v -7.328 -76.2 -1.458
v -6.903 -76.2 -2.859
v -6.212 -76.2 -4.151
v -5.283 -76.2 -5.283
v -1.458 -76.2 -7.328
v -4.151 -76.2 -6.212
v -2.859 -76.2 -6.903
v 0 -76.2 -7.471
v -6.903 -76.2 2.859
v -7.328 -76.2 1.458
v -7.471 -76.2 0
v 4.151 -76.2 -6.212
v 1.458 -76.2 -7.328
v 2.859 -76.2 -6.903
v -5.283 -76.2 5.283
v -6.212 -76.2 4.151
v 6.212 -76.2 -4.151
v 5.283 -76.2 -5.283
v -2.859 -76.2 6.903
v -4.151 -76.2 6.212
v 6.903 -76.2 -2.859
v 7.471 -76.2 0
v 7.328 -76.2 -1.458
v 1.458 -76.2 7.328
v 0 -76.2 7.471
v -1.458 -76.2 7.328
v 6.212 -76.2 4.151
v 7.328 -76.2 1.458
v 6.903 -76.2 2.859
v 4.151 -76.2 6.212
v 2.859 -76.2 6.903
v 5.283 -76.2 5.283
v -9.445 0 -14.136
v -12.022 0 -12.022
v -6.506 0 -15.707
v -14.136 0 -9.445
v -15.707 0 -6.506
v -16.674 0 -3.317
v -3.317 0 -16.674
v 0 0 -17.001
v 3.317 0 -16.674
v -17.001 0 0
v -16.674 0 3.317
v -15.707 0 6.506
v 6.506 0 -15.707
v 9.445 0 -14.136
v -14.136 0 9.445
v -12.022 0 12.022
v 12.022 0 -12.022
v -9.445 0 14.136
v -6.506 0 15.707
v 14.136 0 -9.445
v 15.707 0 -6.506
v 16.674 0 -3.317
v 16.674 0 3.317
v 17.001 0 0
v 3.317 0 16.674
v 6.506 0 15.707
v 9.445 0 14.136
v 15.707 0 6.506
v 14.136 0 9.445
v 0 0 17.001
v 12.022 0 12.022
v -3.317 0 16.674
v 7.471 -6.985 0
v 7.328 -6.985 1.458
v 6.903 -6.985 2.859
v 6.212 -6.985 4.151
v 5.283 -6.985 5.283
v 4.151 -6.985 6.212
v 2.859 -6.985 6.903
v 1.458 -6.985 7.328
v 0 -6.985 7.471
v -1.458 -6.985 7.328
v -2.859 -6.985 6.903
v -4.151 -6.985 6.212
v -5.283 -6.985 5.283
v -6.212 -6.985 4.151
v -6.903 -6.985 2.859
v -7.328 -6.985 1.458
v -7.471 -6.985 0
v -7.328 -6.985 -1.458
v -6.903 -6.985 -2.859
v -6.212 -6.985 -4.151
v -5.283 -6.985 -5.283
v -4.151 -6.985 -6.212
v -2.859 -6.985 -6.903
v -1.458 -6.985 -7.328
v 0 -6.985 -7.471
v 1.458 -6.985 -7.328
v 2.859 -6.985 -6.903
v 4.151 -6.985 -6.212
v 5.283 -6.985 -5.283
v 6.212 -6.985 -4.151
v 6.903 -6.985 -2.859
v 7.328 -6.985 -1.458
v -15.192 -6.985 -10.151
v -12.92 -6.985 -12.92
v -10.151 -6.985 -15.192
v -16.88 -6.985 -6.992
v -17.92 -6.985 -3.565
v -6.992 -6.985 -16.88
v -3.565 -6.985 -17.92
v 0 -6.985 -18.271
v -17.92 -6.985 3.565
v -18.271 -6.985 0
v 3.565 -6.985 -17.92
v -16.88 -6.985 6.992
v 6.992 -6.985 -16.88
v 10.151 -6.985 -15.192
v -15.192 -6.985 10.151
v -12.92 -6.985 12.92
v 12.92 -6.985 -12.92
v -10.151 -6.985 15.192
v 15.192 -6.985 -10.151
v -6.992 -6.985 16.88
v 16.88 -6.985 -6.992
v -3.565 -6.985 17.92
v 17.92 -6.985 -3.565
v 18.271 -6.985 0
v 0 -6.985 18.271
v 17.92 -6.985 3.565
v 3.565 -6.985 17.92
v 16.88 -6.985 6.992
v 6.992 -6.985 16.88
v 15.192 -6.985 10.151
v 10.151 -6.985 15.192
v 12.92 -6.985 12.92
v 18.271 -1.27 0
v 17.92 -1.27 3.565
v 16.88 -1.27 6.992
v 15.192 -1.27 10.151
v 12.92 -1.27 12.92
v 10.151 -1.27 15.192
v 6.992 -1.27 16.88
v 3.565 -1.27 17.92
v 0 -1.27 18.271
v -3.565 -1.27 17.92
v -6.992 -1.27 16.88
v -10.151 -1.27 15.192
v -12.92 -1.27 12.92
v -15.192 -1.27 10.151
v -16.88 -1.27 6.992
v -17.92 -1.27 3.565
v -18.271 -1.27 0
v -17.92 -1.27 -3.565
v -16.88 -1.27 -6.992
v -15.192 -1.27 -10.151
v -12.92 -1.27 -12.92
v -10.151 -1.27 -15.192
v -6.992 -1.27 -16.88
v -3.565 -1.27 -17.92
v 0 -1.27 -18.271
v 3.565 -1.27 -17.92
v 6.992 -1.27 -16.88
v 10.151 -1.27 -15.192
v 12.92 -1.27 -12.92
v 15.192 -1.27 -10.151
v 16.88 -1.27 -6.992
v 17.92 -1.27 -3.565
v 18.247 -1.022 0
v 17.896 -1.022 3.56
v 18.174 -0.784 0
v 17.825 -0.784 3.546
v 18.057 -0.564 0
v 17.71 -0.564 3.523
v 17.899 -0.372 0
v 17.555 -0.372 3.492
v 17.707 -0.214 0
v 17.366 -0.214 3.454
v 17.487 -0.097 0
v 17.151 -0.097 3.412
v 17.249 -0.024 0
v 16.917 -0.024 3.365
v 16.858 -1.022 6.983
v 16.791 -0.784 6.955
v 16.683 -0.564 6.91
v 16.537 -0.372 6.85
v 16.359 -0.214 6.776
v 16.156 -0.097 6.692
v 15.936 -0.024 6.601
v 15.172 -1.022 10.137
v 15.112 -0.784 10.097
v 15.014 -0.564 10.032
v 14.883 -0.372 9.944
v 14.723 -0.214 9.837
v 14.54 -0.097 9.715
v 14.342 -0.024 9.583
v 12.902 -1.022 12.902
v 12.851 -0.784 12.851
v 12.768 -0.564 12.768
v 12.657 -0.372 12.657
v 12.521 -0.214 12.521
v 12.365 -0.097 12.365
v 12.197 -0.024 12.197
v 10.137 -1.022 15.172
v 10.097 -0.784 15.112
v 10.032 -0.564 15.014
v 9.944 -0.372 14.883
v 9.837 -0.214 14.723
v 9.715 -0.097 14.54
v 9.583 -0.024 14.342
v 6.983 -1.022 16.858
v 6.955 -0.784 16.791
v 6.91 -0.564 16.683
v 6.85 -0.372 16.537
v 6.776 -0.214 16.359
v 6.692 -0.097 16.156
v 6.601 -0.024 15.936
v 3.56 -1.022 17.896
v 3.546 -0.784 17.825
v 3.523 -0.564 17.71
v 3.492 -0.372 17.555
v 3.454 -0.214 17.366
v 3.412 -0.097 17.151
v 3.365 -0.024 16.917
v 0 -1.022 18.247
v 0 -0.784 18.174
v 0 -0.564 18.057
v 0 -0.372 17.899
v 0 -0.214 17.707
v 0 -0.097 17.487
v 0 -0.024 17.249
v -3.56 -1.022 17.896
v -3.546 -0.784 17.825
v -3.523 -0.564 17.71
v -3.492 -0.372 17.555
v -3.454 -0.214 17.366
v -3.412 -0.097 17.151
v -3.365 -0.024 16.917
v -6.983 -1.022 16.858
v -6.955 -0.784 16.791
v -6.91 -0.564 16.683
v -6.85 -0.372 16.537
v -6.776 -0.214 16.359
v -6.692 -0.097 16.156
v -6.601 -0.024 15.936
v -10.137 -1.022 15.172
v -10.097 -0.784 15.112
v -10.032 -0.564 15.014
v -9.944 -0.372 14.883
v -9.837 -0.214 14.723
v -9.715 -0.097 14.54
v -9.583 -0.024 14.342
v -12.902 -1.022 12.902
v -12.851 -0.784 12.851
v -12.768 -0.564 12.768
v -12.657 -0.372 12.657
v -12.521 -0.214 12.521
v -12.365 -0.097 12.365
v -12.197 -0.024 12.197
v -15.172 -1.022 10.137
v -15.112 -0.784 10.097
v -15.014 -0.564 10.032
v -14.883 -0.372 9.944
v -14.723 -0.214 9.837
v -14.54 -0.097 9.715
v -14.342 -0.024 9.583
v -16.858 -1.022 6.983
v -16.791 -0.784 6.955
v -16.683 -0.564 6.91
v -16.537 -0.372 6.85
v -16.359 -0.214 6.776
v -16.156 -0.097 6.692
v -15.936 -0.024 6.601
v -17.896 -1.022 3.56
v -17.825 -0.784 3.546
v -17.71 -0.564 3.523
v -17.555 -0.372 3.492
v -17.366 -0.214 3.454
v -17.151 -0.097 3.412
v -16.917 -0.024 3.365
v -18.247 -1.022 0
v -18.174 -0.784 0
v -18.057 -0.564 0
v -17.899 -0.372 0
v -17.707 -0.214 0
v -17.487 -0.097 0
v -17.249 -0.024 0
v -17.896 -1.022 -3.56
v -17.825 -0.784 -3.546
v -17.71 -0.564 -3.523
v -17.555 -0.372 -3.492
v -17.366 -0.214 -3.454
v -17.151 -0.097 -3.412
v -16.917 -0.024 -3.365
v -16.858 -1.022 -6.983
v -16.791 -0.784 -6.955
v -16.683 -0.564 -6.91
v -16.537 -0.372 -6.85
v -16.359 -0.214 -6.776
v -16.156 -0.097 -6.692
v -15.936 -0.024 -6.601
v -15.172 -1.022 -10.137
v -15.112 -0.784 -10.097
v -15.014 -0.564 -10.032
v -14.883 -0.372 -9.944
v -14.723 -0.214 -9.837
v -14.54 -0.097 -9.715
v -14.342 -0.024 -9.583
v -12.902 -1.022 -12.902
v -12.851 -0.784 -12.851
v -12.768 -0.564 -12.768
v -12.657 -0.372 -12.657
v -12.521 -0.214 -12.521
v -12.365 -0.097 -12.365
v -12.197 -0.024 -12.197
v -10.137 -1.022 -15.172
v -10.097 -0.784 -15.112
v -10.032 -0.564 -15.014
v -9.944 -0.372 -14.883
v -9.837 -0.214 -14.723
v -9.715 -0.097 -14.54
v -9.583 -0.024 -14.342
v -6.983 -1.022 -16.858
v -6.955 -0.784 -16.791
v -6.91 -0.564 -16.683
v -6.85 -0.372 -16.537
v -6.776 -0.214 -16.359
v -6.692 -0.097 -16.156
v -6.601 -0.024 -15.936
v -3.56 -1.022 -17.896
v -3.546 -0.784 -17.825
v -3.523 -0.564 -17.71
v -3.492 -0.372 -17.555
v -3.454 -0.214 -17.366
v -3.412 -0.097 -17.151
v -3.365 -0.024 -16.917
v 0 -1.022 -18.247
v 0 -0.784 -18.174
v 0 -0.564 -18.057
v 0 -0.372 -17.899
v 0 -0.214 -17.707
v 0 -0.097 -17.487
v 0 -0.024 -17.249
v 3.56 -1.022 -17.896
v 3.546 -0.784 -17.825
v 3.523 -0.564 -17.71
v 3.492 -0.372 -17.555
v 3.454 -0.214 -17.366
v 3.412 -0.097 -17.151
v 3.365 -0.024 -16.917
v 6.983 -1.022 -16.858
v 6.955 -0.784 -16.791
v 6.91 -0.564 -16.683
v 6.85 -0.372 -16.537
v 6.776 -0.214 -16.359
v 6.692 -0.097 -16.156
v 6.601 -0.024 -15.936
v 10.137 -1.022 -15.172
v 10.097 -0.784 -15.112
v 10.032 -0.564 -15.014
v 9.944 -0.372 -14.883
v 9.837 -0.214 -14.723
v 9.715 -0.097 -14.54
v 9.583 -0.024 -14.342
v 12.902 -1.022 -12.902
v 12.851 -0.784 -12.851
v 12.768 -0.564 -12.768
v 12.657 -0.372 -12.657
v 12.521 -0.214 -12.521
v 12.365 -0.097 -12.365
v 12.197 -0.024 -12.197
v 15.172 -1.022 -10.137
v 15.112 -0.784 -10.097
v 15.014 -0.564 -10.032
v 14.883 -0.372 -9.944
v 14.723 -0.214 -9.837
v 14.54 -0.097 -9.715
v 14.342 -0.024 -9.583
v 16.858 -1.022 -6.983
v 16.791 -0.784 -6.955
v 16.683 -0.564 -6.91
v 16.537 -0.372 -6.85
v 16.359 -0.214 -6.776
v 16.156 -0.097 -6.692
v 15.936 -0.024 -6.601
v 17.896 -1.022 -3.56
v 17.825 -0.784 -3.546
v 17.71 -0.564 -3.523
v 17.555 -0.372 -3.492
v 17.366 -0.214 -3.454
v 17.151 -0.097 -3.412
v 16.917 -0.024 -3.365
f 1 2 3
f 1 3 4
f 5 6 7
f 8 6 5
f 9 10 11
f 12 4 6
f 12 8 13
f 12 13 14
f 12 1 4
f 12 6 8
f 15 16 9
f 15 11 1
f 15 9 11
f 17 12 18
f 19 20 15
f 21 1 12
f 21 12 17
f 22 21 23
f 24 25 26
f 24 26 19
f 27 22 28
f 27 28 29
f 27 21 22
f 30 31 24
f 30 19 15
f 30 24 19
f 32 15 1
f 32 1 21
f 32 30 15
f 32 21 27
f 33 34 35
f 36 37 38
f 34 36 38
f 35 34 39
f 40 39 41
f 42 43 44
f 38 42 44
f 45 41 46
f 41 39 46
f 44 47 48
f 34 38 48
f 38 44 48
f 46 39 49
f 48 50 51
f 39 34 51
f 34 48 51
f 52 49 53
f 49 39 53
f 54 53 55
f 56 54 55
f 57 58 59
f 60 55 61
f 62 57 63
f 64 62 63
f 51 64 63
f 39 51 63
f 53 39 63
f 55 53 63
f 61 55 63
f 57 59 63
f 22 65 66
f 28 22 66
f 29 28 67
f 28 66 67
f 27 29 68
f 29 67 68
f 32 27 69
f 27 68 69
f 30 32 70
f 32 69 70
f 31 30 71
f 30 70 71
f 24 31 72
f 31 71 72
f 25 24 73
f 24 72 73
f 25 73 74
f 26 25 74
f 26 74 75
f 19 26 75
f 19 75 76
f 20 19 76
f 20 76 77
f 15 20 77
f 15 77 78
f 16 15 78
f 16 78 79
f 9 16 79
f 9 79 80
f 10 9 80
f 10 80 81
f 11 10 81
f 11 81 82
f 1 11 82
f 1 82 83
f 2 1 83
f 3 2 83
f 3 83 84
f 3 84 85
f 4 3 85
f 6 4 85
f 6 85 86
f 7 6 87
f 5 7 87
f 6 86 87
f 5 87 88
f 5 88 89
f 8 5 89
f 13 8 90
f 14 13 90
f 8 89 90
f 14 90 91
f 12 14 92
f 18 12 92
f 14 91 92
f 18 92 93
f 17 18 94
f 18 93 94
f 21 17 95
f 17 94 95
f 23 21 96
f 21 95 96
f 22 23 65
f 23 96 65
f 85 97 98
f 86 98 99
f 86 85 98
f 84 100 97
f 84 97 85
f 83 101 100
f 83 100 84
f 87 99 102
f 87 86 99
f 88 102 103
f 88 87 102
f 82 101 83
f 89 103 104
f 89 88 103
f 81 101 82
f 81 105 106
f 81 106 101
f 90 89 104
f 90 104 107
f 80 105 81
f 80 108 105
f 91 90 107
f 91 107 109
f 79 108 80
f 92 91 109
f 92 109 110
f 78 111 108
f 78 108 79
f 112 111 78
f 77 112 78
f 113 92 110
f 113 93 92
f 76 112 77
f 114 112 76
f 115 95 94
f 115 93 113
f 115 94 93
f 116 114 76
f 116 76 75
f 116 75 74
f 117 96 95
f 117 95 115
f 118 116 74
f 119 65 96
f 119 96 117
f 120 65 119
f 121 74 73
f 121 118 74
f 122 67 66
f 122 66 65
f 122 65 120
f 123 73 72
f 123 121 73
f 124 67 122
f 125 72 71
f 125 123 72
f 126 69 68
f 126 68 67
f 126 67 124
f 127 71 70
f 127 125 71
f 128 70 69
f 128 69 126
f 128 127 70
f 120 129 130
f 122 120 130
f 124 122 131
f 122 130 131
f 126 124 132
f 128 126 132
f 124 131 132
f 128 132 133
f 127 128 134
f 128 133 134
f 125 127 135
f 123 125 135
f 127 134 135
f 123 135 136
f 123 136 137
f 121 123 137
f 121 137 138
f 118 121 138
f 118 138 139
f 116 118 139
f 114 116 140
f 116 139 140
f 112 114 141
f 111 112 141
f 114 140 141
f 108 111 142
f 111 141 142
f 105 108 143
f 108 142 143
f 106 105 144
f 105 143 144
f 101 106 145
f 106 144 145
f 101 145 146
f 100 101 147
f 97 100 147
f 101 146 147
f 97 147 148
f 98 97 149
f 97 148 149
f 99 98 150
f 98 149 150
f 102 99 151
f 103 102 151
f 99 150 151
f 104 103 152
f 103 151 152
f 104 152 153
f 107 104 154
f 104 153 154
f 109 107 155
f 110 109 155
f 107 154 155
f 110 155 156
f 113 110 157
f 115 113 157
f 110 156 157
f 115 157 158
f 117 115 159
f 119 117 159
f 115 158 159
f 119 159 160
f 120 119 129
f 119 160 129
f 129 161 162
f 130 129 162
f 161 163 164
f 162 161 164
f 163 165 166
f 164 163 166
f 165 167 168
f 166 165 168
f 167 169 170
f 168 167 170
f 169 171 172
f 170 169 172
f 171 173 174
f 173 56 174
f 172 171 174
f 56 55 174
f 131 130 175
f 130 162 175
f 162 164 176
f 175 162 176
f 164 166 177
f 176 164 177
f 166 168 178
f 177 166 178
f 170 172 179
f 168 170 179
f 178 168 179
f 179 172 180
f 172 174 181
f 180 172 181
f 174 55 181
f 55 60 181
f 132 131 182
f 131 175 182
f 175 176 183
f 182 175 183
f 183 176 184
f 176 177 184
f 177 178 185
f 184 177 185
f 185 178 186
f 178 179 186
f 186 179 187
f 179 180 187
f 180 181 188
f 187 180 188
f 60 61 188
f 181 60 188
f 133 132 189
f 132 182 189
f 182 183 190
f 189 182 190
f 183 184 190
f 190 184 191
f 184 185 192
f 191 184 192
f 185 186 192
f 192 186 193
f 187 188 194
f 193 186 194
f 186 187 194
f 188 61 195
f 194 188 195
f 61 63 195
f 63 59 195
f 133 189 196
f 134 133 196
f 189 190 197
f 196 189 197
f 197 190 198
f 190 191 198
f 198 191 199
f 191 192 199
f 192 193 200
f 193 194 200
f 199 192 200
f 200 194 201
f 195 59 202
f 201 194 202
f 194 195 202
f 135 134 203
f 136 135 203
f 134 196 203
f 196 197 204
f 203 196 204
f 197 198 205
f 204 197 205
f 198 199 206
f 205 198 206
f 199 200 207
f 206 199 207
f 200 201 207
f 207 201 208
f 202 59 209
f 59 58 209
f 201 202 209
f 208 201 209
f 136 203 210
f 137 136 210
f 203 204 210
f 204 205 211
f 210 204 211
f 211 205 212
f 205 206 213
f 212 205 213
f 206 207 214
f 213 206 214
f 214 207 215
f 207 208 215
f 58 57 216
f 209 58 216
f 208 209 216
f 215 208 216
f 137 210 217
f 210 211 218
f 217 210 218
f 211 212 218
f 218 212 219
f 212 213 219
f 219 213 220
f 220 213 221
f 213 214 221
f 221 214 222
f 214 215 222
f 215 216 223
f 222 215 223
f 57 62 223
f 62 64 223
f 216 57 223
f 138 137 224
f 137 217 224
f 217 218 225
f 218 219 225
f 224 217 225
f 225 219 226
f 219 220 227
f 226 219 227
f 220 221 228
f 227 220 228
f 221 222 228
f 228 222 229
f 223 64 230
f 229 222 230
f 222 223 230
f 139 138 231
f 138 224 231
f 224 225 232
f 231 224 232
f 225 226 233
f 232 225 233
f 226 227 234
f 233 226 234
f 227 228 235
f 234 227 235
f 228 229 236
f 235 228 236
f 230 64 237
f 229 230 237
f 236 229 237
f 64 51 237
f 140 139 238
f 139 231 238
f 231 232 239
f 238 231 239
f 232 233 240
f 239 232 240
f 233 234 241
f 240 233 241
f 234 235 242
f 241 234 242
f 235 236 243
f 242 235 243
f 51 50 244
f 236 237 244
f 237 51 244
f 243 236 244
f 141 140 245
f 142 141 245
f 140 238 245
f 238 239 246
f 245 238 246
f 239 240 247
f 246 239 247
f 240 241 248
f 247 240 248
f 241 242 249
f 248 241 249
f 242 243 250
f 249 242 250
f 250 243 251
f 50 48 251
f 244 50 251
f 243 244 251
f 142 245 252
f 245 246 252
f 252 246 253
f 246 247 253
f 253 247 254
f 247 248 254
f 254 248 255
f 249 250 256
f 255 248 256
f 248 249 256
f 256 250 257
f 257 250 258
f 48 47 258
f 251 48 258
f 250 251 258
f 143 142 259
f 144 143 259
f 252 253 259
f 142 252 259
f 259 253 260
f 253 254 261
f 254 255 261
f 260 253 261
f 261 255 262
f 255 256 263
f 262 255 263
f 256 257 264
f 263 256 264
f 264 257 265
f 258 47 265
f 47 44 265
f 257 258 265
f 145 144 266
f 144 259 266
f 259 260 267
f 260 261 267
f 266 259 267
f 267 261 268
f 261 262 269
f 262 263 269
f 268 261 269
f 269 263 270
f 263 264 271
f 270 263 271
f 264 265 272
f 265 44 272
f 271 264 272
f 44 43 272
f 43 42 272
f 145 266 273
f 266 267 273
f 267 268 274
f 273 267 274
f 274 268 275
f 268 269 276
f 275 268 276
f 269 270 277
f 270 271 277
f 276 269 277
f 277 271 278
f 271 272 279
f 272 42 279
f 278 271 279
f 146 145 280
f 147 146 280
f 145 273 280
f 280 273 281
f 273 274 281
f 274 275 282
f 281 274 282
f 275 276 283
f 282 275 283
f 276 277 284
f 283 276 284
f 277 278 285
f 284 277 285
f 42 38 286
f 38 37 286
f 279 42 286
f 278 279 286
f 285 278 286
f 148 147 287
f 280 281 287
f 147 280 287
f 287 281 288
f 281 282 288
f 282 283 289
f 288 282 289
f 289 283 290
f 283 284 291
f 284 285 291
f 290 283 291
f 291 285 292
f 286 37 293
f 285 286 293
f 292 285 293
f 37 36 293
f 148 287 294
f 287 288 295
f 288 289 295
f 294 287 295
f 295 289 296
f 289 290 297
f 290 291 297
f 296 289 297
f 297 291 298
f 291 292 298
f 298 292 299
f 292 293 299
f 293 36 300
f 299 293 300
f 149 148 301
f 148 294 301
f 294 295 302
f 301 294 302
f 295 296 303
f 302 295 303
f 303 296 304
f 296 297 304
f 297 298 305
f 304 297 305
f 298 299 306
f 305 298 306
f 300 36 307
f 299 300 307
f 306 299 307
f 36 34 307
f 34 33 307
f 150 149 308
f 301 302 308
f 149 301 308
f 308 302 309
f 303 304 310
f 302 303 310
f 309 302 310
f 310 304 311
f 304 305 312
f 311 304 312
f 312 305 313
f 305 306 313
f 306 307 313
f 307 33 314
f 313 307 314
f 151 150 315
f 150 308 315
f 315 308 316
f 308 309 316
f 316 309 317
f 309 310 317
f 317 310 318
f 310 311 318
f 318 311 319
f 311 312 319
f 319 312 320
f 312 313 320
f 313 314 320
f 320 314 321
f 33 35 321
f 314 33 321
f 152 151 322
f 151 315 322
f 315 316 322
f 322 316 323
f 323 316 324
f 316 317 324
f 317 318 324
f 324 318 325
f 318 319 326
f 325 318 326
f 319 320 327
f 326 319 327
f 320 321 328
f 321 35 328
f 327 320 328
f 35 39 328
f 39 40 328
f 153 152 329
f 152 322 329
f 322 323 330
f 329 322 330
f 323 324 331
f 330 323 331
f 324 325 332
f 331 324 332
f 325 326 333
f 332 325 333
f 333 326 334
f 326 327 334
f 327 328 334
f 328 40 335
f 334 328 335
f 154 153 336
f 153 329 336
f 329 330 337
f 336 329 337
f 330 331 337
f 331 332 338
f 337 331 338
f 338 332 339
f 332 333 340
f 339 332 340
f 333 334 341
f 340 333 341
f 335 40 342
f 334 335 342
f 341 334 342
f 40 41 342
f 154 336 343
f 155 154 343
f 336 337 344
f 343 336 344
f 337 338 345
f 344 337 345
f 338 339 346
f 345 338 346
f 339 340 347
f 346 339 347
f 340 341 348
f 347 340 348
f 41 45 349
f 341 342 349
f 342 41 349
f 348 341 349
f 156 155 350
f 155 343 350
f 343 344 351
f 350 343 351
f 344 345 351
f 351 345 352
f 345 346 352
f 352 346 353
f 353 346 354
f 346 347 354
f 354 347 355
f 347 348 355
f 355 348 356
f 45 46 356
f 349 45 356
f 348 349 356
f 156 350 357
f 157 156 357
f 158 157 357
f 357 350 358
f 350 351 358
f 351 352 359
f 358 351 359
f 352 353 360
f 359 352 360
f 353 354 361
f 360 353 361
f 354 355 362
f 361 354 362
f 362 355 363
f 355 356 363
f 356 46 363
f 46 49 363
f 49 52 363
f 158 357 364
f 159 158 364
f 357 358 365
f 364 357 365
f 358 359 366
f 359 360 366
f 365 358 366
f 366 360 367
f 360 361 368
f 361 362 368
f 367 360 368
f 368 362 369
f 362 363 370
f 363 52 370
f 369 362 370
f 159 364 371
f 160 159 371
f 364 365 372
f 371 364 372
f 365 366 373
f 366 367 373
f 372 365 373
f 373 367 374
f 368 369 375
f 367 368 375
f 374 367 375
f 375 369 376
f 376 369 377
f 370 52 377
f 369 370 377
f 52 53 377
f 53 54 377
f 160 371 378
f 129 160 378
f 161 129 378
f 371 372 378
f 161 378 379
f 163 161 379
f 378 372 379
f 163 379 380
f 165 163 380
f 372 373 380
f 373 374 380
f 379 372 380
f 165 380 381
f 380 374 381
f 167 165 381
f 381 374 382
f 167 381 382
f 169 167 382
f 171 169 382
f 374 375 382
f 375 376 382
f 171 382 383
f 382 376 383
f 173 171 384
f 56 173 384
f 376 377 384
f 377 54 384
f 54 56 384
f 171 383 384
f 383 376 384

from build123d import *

# Parameters (mm, degrees)
F0_R     = 7.47149
F1_DEPTH = 76.2
F2_R     = 18.271136
F3_DEPTH = 6.985
F4_R     = 1.27


with BuildPart() as f1:
    # F0 (on Front) → F1 (new body)
    with BuildSketch(Plane.XZ):
        Circle(F0_R)
    extrude(amount=F1_DEPTH)

    # F2 (on Front) → F3 (join)
    with BuildSketch(Plane.XZ):
        Circle(F2_R)
    extrude(amount=F3_DEPTH)

    # F4
    f4_edges = [f1.edges().sort_by_distance(p)[0] for p in [
        (-18.271136, 0, 0),
    ]]
    fillet(f4_edges, radius=F4_R)


solid = f1.part
